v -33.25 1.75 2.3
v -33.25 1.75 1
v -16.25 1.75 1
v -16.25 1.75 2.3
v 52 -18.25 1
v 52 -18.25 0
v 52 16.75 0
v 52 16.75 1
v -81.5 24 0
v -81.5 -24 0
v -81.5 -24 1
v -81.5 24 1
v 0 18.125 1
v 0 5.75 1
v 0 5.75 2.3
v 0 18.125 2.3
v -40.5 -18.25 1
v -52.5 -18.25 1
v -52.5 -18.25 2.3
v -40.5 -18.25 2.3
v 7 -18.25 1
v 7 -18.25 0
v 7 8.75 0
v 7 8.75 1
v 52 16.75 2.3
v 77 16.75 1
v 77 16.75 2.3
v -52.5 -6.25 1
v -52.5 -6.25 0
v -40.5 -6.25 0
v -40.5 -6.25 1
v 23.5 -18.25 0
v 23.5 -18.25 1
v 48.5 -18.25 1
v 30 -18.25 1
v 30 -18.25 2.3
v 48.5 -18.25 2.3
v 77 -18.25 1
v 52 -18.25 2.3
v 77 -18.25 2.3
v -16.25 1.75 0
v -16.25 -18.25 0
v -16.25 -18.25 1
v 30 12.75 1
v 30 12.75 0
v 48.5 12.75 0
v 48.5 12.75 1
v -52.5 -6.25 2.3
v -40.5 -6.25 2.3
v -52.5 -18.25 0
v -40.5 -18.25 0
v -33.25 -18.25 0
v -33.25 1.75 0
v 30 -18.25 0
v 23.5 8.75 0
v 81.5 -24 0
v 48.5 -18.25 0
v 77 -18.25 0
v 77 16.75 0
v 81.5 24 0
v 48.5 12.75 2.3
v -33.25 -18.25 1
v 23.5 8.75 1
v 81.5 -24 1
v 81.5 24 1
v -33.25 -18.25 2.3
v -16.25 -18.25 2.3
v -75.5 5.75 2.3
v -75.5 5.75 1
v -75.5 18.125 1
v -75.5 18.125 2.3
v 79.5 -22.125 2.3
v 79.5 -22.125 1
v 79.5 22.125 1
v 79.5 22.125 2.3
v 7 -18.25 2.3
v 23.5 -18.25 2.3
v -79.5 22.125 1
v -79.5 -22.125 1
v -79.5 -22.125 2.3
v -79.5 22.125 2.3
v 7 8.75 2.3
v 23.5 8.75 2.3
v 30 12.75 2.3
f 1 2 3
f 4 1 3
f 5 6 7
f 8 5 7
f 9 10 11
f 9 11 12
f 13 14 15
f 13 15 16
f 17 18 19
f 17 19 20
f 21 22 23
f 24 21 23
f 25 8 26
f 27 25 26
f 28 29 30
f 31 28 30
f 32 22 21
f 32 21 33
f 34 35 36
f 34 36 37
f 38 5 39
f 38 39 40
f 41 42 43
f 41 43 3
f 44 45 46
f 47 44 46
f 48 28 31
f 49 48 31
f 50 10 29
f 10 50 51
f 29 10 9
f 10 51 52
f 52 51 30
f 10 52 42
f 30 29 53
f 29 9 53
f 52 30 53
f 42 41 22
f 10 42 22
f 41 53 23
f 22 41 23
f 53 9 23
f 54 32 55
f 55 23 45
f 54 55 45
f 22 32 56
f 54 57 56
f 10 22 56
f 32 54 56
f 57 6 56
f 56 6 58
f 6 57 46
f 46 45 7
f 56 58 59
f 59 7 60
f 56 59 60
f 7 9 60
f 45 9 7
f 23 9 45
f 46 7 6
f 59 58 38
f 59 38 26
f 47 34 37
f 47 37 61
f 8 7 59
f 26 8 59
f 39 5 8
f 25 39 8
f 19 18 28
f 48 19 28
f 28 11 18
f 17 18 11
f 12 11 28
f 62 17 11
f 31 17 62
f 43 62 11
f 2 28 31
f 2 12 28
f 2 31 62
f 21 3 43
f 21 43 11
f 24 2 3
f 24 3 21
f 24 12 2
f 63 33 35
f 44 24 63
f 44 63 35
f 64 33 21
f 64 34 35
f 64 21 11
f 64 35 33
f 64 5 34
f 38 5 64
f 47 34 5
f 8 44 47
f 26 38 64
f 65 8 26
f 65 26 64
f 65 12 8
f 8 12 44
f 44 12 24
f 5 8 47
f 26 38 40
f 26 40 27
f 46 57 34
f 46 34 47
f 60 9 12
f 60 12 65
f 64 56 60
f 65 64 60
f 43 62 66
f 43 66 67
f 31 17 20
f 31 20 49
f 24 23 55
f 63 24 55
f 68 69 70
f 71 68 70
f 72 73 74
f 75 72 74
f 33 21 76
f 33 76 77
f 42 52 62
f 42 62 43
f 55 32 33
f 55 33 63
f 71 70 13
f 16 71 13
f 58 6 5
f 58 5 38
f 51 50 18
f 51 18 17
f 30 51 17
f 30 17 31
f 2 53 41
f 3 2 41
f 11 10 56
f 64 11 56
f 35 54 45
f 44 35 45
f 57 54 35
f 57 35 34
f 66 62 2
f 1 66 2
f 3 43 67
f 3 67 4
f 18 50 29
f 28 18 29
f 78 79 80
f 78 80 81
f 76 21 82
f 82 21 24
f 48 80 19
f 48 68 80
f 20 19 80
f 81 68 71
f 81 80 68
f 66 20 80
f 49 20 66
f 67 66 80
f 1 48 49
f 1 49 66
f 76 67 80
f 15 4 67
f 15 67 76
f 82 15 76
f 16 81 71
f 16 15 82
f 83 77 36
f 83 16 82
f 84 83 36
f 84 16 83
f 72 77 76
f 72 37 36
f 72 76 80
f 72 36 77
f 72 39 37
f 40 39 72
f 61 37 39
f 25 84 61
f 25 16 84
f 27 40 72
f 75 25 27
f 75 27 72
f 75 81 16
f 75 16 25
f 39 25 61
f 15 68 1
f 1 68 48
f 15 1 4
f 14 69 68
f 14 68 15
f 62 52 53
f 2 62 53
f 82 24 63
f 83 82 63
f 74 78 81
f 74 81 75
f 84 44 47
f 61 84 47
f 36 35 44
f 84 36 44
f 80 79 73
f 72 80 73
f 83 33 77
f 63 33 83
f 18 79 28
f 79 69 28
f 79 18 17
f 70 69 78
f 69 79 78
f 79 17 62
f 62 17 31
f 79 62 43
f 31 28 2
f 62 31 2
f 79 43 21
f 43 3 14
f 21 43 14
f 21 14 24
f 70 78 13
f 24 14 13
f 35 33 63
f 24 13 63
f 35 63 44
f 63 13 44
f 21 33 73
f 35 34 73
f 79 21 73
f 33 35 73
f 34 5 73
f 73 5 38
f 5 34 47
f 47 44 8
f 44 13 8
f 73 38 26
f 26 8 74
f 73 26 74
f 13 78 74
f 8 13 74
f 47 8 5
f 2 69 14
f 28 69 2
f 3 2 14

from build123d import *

# Parameters (mm, degrees)
SKETCH_W      = 159
SKETCH_H      = 44.25
SKETCH_W_2    = 25
SKETCH_H_2    = 35
SKETCH_W_3    = 18.5
SKETCH_H_3    = 31
SKETCH_W_4    = 16.5
SKETCH_H_4    = 27
SKETCH_W_5    = 17
SKETCH_H_5    = 20
SKETCH_W_6    = 12
SKETCH_H_6    = 12
SKETCH_W_7    = 75.5
SKETCH_H_7    = 12.375
PAD001_DEPTH  = 1.3
SKETCH001_W   = 163
SKETCH001_H   = 48
SKETCH001_W_2 = 25
SKETCH001_H_2 = 35
SKETCH001_W_3 = 18.5
SKETCH001_H_3 = 31
SKETCH001_W_4 = 16.5
SKETCH001_H_4 = 27
SKETCH001_W_5 = 17
SKETCH001_H_5 = 20
SKETCH001_W_6 = 12
SKETCH001_H_6 = 12
PAD_DEPTH     = 1


with BuildPart() as pad001:
    # Sketch → Pad001 (new body)
    with BuildSketch(Plane.XY.offset(1)):
        Rectangle(SKETCH_W, SKETCH_H)
        with Locations((64.5, -0.75)):
            Rectangle(SKETCH_W_2, SKETCH_H_2, mode=Mode.SUBTRACT)
        with Locations((39.25, -2.75)):
            Rectangle(SKETCH_W_3, SKETCH_H_3, mode=Mode.SUBTRACT)
        with Locations((15.25, -4.75)):
            Rectangle(SKETCH_W_4, SKETCH_H_4, mode=Mode.SUBTRACT)
        with Locations((-24.75, -8.25)):
            Rectangle(SKETCH_W_5, SKETCH_H_5, mode=Mode.SUBTRACT)
        with Locations((-46.5, -12.25)):
            Rectangle(SKETCH_W_6, SKETCH_H_6, mode=Mode.SUBTRACT)
        with Locations((-37.75, 11.9375)):
            Rectangle(SKETCH_W_7, SKETCH_H_7, mode=Mode.SUBTRACT)
    extrude(amount=PAD001_DEPTH)


with BuildPart() as pad:
    # Sketch001 → Pad (new body)
    with BuildSketch(Plane.XY):
        Rectangle(SKETCH001_W, SKETCH001_H)
        with Locations((64.5, -0.75)):
            Rectangle(SKETCH001_W_2, SKETCH001_H_2, mode=Mode.SUBTRACT)
        with Locations((39.25, -2.75)):
            Rectangle(SKETCH001_W_3, SKETCH001_H_3, mode=Mode.SUBTRACT)
        with Locations((15.25, -4.75)):
            Rectangle(SKETCH001_W_4, SKETCH001_H_4, mode=Mode.SUBTRACT)
        with Locations((-24.75, -8.25)):
            Rectangle(SKETCH001_W_5, SKETCH001_H_5, mode=Mode.SUBTRACT)
        with Locations((-46.5, -12.25)):
            Rectangle(SKETCH001_W_6, SKETCH001_H_6, mode=Mode.SUBTRACT)
    extrude(amount=PAD_DEPTH)


solid = Compound([pad001.part, pad.part])
